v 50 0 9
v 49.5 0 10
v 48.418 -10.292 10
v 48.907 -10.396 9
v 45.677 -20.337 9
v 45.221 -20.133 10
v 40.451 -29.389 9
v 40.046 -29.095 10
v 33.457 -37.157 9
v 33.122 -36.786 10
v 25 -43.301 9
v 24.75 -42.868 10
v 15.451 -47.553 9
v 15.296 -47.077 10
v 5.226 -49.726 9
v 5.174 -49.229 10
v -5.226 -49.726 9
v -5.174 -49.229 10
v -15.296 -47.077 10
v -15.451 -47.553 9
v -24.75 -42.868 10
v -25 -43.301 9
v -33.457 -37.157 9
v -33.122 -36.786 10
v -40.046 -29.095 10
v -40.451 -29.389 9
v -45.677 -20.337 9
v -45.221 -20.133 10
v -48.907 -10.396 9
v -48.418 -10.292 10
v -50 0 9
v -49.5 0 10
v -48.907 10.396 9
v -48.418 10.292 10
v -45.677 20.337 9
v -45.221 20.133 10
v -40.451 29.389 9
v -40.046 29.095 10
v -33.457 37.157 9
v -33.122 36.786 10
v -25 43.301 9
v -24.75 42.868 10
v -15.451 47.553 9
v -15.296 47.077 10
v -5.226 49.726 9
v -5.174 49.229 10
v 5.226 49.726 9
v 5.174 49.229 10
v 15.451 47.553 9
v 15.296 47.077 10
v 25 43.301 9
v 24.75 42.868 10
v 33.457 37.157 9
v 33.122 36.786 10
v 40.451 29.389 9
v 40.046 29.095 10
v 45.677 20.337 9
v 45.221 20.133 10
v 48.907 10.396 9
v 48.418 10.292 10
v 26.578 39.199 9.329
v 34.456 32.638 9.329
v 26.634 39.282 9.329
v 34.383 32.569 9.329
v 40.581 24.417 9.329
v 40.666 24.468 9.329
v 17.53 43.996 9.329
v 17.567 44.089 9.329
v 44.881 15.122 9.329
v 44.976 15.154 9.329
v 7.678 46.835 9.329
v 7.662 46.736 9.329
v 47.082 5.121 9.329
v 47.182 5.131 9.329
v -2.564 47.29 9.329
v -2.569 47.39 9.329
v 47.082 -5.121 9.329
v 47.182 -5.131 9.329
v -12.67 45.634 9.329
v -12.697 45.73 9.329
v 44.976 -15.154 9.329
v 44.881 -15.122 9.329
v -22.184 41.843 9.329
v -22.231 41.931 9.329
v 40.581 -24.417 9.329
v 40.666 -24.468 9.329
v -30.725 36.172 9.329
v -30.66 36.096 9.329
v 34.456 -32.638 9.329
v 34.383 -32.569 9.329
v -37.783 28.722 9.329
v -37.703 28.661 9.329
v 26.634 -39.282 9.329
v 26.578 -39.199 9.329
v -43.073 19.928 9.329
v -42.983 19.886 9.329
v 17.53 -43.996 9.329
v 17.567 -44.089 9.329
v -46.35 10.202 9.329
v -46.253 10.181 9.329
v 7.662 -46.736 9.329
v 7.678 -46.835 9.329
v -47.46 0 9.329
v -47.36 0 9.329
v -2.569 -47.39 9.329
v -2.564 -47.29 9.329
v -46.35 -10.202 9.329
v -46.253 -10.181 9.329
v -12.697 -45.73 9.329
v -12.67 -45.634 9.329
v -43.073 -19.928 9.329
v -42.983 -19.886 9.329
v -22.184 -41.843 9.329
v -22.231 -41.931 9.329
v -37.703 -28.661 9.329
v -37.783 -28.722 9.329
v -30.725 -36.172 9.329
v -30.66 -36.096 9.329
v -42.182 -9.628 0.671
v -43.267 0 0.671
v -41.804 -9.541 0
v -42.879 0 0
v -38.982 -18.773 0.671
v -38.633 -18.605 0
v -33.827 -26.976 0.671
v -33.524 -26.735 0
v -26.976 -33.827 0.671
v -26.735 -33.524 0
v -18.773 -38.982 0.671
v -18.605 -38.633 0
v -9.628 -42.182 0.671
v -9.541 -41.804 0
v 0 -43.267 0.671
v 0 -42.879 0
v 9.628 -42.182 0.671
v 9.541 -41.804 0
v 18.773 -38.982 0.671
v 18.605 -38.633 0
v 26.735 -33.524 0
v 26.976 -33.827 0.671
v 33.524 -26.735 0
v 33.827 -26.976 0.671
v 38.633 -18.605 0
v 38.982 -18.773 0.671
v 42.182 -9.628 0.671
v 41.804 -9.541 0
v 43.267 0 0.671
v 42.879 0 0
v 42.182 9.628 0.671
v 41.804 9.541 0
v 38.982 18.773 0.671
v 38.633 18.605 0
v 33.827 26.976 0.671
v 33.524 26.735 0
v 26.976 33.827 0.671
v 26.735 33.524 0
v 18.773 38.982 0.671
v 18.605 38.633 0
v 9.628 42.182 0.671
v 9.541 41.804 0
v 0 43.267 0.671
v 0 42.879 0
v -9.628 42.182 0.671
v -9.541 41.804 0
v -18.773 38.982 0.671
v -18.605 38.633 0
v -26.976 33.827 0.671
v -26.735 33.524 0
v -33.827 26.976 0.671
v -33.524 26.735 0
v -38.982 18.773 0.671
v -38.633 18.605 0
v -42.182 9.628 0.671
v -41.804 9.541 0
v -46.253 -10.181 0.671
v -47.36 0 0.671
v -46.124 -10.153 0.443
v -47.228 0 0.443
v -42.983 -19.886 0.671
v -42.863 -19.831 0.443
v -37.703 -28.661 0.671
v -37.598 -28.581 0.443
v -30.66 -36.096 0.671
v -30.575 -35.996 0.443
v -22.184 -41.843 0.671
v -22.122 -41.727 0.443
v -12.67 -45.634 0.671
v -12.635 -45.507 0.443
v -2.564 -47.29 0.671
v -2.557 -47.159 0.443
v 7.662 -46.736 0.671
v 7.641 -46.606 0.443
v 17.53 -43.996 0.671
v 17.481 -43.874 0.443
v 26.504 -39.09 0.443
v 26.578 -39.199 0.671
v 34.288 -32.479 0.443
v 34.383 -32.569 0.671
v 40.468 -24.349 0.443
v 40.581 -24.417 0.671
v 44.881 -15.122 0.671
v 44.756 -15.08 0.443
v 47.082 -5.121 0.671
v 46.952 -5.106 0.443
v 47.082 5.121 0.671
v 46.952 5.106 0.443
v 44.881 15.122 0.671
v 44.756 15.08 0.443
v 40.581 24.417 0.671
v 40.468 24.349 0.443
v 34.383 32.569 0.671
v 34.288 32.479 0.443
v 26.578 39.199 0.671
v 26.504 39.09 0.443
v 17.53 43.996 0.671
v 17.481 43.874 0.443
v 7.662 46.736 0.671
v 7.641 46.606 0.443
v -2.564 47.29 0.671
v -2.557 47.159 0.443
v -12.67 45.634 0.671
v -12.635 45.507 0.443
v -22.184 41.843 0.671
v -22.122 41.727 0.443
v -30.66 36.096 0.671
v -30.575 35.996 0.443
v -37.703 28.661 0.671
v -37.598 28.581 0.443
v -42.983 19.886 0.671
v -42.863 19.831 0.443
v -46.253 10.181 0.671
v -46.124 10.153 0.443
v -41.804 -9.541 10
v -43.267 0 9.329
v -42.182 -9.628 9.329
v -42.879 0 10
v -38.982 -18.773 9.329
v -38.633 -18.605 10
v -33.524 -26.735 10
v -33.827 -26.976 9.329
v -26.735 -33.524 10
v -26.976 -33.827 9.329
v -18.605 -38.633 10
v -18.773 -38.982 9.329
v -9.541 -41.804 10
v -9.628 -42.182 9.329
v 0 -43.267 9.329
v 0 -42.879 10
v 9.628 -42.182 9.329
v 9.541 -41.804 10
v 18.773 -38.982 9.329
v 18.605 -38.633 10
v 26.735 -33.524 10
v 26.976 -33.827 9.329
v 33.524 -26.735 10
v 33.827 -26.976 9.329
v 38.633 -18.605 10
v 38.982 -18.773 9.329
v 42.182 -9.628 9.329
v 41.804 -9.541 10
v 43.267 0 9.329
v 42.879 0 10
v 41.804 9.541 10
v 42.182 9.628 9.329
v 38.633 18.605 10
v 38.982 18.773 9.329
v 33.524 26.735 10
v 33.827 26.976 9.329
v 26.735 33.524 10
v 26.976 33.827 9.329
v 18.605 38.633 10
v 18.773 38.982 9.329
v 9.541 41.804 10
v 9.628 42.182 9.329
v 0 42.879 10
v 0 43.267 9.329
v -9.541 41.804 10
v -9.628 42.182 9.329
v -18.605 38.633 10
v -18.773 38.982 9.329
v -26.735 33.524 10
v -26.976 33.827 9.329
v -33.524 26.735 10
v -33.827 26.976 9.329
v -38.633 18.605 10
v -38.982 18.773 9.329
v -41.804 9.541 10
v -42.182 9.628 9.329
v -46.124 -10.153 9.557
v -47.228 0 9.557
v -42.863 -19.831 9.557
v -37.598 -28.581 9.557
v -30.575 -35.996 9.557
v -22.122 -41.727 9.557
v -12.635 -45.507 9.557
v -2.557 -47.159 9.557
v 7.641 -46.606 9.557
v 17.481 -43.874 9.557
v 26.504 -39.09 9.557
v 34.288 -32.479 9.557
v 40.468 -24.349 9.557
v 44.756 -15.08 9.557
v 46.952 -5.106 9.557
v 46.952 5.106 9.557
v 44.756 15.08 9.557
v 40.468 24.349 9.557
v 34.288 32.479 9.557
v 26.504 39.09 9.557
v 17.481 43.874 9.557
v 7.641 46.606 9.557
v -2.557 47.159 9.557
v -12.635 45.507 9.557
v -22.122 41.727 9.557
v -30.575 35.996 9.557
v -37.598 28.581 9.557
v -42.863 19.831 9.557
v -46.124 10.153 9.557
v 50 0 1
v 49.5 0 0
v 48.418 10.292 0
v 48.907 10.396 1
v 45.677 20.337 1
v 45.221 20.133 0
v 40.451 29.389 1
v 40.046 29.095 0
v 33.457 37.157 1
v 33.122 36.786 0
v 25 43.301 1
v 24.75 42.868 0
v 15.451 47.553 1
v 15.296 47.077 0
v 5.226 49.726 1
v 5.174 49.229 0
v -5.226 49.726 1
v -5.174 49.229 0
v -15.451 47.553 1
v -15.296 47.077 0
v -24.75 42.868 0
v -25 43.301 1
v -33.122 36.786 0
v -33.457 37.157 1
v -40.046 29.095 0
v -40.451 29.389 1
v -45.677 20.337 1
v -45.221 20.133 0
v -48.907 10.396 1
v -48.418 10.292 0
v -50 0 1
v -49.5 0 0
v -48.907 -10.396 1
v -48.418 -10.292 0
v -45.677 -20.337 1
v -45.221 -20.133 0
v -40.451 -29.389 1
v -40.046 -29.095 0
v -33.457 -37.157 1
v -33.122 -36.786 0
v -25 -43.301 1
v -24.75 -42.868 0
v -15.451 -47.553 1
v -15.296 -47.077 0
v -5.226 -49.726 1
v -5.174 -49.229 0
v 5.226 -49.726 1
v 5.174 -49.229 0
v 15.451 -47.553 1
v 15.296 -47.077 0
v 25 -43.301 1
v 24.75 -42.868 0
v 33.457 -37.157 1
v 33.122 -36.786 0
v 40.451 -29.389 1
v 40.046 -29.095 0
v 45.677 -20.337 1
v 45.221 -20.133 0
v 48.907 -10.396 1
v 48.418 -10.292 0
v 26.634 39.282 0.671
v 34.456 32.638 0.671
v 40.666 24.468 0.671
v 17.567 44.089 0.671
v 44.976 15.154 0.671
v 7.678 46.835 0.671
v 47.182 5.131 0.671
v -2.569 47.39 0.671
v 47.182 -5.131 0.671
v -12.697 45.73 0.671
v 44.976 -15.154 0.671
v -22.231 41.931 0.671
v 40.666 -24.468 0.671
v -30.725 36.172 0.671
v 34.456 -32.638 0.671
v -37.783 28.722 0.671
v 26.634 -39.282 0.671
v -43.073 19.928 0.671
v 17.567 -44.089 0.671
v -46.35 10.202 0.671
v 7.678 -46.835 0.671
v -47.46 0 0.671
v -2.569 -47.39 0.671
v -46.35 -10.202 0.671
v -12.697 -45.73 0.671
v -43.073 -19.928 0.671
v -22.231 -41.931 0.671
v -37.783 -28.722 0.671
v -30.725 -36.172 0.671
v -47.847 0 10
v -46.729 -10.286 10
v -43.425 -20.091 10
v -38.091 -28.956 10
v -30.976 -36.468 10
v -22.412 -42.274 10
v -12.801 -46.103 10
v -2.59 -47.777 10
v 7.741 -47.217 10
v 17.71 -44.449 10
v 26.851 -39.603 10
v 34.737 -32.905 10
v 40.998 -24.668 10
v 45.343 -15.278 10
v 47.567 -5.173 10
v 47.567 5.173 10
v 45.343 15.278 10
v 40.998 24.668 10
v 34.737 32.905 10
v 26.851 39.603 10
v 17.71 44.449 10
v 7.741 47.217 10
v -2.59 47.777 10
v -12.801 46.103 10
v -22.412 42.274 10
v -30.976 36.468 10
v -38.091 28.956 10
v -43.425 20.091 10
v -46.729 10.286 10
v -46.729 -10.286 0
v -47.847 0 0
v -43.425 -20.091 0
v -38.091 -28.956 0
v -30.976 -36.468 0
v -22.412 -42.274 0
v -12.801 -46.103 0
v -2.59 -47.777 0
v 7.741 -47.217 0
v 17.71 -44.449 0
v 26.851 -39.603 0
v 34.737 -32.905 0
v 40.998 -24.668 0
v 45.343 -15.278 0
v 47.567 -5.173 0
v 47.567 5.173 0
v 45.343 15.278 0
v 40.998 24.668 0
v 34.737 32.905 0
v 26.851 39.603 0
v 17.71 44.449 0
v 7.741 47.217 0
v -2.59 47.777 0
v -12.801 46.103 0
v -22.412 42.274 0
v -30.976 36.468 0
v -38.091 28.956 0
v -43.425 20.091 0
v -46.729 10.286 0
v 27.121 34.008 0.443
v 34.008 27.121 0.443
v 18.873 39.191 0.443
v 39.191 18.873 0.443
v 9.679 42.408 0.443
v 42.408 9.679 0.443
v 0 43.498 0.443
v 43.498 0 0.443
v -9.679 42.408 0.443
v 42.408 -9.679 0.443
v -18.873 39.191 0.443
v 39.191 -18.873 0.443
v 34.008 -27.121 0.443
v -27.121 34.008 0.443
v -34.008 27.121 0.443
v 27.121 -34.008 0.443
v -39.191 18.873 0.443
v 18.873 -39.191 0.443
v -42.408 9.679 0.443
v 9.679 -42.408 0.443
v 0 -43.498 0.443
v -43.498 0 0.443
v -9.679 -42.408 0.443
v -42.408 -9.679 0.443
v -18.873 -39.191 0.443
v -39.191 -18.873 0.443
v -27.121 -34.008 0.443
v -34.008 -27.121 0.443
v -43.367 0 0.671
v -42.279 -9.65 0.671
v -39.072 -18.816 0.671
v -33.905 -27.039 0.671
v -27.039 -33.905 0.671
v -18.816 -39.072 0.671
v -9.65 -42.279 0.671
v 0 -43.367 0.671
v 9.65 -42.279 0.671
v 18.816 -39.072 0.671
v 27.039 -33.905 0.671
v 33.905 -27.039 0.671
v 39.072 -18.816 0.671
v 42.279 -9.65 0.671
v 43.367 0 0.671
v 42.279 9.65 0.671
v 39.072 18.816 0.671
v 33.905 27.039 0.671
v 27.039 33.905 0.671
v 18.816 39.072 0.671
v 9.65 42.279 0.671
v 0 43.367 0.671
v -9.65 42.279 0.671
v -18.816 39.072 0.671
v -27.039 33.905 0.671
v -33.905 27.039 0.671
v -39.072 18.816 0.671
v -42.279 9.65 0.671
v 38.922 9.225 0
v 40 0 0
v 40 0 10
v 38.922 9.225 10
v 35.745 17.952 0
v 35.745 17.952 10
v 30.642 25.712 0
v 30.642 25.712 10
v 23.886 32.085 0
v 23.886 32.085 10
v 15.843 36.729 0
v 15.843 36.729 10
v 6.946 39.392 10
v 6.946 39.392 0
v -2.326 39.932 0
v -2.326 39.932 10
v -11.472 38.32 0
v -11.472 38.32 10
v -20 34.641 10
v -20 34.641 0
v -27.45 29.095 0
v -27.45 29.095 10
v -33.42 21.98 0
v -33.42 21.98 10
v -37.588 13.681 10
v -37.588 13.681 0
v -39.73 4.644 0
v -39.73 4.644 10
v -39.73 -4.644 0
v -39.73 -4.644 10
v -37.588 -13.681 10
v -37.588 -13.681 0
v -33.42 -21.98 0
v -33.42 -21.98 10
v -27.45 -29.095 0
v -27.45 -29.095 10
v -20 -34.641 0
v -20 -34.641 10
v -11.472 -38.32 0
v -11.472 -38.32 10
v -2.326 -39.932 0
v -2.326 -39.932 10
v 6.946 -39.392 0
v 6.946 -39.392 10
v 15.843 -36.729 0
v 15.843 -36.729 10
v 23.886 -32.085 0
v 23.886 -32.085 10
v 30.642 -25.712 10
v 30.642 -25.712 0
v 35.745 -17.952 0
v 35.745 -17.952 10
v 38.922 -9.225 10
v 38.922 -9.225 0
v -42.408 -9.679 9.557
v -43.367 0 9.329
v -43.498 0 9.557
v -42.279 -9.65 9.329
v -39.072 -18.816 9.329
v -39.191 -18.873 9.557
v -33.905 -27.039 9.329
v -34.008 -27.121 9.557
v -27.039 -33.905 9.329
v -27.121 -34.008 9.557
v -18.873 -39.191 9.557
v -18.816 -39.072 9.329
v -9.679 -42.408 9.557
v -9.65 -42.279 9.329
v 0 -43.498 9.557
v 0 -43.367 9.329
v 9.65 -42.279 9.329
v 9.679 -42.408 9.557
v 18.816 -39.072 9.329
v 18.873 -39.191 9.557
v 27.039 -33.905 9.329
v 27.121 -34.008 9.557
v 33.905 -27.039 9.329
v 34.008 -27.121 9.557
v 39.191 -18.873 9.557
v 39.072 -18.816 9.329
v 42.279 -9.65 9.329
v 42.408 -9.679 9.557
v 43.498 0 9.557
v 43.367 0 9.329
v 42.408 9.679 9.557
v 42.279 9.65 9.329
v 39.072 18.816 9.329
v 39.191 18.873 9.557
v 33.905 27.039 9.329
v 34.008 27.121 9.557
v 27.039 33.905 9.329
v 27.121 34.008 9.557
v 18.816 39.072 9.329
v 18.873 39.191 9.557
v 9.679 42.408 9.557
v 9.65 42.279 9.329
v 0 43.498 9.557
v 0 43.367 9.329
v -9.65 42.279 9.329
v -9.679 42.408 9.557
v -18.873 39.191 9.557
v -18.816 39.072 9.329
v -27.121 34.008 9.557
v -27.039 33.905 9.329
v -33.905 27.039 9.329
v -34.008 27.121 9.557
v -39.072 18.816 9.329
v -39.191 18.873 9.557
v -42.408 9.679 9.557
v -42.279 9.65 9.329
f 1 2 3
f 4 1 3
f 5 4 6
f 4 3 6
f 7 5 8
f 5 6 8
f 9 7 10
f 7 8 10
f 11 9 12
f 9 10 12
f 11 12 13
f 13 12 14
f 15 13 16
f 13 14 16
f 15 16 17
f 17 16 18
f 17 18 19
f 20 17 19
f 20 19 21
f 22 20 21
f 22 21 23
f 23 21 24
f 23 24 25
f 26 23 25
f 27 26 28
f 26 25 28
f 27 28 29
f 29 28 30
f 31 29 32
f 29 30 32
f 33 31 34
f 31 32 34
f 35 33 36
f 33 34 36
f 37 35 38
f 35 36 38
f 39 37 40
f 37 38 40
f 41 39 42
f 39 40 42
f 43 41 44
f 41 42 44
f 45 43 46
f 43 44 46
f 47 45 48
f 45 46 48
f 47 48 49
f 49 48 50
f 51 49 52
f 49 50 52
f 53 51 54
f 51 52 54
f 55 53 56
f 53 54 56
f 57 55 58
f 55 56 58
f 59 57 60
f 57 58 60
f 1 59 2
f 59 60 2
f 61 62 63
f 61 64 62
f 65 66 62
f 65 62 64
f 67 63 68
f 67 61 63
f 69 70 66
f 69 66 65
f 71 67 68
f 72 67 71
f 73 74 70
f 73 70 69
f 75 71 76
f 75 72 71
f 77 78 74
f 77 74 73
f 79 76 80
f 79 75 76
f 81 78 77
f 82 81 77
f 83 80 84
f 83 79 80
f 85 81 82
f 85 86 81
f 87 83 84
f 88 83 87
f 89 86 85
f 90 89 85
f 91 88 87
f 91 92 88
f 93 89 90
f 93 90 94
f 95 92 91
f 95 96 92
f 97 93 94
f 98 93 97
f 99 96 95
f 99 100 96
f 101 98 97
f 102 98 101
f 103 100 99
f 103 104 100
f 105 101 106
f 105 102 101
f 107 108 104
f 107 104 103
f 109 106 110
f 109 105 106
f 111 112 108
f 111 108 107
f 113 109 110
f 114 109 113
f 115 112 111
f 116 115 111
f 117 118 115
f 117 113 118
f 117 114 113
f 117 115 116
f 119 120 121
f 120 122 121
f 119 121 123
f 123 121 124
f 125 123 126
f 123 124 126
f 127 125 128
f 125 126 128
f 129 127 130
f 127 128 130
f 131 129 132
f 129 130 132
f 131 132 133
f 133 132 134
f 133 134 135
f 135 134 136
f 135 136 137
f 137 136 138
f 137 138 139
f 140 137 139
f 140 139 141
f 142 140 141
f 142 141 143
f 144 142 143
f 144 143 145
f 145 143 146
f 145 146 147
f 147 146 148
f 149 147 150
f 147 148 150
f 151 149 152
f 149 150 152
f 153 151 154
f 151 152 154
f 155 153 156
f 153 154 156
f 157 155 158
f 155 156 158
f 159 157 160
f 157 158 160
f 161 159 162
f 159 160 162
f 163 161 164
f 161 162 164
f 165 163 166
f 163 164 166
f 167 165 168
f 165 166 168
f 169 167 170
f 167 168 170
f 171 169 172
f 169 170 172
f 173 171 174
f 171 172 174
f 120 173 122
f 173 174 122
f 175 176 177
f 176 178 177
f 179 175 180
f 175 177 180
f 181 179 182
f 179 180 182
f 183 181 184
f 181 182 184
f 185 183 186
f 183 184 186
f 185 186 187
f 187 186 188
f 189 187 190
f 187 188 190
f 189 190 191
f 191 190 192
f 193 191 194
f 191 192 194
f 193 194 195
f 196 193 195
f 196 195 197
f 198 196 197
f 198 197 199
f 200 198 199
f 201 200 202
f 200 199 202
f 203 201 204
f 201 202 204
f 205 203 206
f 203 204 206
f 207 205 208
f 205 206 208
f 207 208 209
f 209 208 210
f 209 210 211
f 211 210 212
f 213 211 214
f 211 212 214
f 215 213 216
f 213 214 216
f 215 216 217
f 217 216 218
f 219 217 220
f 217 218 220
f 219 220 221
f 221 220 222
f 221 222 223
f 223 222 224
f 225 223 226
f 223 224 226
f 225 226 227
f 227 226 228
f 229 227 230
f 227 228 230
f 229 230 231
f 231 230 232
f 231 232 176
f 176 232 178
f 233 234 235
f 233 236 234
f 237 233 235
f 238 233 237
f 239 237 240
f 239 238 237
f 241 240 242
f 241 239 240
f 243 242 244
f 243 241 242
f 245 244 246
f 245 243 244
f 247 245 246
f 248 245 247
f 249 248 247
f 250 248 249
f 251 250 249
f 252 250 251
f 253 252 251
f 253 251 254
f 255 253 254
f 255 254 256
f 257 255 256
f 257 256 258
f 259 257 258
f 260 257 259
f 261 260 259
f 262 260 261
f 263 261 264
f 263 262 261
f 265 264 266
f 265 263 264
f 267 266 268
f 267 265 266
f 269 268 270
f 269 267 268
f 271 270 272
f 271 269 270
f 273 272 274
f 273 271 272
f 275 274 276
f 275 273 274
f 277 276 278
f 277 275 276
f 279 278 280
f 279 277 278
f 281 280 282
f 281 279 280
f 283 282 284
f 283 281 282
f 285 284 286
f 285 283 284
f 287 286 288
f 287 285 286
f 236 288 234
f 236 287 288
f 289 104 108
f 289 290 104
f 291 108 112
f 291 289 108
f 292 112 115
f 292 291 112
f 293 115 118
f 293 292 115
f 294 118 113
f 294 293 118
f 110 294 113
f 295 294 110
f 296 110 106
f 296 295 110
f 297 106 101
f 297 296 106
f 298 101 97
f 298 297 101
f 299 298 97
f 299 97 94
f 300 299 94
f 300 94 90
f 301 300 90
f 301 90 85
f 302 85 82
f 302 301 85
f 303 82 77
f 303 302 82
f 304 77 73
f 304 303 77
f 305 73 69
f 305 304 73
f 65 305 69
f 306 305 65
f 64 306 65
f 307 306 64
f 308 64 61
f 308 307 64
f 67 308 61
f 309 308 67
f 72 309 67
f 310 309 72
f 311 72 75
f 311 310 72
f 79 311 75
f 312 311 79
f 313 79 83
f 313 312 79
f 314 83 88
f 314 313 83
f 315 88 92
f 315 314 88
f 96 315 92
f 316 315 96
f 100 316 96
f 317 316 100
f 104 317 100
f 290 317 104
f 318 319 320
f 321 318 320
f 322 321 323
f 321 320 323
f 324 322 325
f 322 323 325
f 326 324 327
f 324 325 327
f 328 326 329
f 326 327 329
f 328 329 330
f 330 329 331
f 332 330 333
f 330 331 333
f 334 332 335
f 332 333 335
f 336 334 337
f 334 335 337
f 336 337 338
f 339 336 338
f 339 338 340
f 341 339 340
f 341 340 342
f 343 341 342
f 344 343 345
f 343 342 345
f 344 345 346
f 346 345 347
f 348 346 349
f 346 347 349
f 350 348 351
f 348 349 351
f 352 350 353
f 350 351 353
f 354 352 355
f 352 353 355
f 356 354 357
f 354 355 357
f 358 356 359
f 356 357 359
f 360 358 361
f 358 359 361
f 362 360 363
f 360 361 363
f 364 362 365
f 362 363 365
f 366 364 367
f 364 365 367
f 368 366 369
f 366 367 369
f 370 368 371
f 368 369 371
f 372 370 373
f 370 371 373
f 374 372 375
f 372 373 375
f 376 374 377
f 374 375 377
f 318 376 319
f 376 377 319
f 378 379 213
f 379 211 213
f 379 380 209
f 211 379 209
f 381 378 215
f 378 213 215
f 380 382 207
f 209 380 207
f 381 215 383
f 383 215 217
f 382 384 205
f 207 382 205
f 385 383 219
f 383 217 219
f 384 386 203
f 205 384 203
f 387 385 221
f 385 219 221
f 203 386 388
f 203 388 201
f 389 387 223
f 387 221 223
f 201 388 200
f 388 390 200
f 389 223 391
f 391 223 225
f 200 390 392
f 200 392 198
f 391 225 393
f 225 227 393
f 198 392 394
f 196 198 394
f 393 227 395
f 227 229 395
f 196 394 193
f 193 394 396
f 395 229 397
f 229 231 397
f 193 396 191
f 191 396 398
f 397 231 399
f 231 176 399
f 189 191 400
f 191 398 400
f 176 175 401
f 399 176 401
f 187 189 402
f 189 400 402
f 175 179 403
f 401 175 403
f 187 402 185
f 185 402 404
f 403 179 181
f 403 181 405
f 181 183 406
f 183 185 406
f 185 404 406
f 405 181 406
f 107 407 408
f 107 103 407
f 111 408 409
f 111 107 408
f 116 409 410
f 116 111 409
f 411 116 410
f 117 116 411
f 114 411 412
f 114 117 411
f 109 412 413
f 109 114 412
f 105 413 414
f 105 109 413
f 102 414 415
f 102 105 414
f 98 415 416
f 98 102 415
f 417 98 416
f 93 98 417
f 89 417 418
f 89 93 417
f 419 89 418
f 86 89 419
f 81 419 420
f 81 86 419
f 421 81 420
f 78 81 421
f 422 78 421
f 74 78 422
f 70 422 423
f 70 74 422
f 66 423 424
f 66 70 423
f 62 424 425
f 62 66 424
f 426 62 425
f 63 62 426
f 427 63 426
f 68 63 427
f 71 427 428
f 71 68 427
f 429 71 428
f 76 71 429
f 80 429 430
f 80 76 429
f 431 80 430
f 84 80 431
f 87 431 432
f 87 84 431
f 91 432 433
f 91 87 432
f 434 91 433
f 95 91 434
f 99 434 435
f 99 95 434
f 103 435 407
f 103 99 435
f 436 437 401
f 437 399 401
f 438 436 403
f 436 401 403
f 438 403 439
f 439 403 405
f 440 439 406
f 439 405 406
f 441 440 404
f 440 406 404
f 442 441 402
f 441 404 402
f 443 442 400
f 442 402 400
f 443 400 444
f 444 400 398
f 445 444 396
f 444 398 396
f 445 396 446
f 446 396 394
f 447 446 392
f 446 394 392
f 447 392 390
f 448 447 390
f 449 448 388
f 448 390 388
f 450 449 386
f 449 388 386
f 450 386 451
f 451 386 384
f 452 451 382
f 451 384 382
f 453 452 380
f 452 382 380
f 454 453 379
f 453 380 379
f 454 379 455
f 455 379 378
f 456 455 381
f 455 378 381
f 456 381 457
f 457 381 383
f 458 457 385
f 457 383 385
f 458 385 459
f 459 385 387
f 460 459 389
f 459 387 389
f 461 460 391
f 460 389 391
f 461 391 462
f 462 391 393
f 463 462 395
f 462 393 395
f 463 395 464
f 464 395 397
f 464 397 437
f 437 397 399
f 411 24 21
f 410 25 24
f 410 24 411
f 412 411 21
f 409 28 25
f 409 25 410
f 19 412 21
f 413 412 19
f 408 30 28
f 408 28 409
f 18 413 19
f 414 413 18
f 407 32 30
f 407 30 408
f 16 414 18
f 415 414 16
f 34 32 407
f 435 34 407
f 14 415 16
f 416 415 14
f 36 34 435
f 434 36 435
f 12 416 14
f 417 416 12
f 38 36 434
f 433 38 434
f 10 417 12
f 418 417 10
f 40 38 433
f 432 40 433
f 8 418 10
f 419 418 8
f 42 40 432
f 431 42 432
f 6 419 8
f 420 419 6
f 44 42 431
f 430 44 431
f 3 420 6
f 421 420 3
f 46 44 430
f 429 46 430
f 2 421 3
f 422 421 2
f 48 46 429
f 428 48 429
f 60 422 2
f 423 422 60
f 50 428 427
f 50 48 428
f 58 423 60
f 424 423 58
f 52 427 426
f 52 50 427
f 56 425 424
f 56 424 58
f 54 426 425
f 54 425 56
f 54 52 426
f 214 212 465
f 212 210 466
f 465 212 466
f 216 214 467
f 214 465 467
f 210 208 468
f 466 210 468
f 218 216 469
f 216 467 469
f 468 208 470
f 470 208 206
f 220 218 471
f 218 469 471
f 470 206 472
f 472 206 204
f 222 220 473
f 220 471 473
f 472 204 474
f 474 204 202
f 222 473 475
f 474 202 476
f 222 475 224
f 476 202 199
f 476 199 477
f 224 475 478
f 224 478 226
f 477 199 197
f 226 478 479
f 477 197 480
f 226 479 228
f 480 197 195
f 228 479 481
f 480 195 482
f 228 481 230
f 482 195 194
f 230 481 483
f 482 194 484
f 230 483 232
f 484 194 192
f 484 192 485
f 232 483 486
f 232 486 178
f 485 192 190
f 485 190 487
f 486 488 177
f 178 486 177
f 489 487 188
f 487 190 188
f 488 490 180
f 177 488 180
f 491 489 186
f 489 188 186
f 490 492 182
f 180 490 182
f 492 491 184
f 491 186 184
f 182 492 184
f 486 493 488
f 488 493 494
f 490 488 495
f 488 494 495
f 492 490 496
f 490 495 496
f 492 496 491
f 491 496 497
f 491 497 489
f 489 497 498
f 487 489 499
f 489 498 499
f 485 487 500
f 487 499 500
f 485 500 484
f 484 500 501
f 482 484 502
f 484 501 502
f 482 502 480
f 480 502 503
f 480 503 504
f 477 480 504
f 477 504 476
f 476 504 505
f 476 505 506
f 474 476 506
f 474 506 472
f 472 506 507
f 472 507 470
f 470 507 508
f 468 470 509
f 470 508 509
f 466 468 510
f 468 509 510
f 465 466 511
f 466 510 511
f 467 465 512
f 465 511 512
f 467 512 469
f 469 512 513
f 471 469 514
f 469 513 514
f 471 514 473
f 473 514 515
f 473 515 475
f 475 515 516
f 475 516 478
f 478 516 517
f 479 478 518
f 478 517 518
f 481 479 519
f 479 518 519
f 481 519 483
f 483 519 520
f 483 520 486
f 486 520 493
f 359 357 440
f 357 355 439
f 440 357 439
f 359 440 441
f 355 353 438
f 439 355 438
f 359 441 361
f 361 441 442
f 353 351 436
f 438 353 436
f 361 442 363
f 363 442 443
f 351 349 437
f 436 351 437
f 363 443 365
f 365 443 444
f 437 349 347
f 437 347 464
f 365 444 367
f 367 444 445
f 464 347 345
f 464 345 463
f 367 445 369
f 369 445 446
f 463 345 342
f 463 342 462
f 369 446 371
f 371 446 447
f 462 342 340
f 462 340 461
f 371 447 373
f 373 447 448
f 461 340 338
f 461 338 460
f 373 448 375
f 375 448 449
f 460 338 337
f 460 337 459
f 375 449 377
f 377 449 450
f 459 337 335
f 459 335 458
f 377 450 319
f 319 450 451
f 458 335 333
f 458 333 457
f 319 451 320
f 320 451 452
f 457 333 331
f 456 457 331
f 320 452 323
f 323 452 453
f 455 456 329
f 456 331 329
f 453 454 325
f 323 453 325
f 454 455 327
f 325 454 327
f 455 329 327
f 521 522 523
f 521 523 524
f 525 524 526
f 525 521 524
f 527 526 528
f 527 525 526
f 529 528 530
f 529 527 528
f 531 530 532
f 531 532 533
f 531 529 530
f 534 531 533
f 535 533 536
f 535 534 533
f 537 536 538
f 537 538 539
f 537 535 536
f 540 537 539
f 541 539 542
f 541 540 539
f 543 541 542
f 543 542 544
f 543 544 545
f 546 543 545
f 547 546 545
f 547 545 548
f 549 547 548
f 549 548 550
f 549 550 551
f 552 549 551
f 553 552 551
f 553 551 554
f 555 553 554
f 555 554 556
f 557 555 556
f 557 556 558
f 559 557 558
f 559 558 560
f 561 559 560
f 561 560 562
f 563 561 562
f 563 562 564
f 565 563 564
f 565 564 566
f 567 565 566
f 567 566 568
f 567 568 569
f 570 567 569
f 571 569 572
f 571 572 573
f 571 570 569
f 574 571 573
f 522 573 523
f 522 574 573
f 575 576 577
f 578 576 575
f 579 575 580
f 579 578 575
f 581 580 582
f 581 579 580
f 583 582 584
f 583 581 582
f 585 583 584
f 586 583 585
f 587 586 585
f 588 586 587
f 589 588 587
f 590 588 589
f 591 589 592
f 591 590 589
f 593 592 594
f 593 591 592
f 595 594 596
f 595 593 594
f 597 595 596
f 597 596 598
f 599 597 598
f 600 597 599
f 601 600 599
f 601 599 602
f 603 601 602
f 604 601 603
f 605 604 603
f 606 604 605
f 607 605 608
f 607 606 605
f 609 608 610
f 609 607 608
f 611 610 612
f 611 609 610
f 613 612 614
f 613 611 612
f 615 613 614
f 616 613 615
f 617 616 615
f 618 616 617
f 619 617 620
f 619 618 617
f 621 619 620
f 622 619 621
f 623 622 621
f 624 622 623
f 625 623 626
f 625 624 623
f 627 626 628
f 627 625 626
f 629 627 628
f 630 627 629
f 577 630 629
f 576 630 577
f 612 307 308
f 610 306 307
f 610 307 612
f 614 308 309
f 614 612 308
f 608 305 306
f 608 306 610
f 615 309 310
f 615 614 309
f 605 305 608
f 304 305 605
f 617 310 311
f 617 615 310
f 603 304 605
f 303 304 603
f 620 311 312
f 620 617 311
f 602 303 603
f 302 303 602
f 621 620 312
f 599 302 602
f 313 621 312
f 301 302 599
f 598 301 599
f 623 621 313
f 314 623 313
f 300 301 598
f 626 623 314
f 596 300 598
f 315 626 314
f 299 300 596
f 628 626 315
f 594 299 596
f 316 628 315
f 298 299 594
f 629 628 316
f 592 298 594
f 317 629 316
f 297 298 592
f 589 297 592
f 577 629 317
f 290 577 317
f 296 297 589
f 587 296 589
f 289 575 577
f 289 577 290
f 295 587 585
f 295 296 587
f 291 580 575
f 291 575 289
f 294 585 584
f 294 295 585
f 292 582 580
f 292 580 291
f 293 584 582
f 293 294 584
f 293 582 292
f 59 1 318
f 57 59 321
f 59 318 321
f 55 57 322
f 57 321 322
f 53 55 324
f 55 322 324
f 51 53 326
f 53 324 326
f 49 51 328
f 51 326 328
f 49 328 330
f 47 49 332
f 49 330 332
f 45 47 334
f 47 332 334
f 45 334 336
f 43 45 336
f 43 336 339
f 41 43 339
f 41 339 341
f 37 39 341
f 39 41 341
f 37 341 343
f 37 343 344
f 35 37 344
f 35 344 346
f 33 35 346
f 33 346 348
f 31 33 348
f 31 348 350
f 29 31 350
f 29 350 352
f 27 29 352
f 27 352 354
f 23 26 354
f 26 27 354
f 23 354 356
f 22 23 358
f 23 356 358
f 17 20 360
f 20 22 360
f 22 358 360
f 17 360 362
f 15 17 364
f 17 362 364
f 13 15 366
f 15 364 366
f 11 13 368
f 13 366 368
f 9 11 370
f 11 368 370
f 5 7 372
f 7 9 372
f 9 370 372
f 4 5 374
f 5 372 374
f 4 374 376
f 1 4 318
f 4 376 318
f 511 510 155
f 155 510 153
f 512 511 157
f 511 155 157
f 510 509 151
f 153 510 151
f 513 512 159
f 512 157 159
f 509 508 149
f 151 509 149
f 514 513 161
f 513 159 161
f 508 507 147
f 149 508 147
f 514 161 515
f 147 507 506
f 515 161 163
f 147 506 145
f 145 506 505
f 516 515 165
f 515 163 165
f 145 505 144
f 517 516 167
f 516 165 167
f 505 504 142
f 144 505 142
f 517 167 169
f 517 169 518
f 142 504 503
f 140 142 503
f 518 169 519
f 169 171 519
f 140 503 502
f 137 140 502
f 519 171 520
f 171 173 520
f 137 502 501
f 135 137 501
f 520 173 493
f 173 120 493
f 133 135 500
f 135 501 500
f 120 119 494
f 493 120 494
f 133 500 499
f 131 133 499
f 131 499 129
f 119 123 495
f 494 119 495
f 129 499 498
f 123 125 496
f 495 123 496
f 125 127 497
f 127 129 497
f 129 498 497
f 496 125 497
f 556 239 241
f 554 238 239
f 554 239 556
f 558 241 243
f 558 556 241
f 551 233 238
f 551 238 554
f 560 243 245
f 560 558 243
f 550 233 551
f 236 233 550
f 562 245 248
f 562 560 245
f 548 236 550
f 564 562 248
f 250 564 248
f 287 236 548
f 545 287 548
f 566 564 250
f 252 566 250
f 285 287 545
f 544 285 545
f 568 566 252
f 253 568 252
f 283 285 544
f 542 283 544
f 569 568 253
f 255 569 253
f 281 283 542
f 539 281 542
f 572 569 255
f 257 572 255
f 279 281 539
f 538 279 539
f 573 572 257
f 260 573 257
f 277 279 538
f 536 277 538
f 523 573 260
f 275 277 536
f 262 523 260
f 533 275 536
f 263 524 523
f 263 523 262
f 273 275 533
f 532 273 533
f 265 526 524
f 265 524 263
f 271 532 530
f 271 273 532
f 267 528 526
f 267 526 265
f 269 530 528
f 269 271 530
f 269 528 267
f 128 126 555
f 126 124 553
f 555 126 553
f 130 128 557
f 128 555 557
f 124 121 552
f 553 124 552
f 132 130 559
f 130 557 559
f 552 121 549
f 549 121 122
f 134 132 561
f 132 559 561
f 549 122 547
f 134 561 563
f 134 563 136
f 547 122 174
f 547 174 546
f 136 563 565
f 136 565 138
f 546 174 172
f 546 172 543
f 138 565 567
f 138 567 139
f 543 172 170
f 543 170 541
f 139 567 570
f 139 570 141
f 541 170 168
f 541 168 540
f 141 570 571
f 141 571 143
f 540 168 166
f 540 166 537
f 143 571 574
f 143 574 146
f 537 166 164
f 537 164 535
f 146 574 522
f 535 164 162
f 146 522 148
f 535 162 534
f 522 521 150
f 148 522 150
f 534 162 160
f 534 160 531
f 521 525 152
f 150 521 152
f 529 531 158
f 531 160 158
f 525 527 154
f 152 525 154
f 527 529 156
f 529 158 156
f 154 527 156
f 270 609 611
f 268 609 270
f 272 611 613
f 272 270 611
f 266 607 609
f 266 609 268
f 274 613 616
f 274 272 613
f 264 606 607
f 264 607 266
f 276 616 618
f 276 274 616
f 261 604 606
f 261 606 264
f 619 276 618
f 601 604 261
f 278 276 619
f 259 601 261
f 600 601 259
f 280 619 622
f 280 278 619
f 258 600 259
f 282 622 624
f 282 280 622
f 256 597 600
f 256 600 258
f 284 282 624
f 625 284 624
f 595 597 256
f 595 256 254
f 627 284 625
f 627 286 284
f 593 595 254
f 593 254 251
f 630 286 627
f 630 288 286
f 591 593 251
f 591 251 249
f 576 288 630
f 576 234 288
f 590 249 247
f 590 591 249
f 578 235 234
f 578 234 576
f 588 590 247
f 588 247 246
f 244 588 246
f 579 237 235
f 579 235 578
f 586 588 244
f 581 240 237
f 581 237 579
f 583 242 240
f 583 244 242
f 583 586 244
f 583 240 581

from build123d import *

# Parameters (mm, degrees)
F0_R     = 50
F0_R_2   = 40
F1_DEPTH = 10
F5_SIZE2 = 0.5
F5_SIZE  = 1


# Not quite as in the source:
# - a pattern or mirror of a feature is missing from the dataset's text; its kind, count and spacing are read off the source's solid


with BuildPart() as f1:
    # F0 (on Top) → F1 (new body)
    with BuildSketch(Plane.XY):
        Circle(F0_R)
        Circle(F0_R_2, mode=Mode.SUBTRACT)
    extrude(amount=F1_DEPTH)

    # F2 (on Front) → F3 (revolve, cut)
    with BuildSketch(Plane.XZ):
        Polygon((-50, 13.4113135189), (-50, 10), (-47.8474881957, 10), (-47.4599111567, 9.3286968768), (-47.3599111567, 9.3286968768), (-47.2283720253, 9.5565293356), (-43.498182123, 9.5565293356), (-43.3666429916, 9.3286968768), (-43.2666429916, 9.3286968768), (-42.8790659527, 10), (-40, 10), (-40, 13.4113135189), align=None)
    f3 = revolve(axis=Axis((0, 0, 10.9280112665), (0, 0, 1)), mode=Mode.SUBTRACT)

    # F3_copies: F3 across plane
    add(f3.mirror(Plane(origin=(0, 0, 5), x_dir=(-1, 0, 0), z_dir=(0, 0, -1))), mode=Mode.SUBTRACT)

    # F5
    f5_edges = [f1.edges().sort_by_distance(p)[0] for p in [
        (-50, 0, 10),
        (-50, 0, 0),
    ]]
    f5_side = f1.faces().sort_by_distance((-50, 0, 5))[0]
    chamfer(f5_edges, length=F5_SIZE, length2=F5_SIZE2, reference=f5_side)


solid = f1.part
